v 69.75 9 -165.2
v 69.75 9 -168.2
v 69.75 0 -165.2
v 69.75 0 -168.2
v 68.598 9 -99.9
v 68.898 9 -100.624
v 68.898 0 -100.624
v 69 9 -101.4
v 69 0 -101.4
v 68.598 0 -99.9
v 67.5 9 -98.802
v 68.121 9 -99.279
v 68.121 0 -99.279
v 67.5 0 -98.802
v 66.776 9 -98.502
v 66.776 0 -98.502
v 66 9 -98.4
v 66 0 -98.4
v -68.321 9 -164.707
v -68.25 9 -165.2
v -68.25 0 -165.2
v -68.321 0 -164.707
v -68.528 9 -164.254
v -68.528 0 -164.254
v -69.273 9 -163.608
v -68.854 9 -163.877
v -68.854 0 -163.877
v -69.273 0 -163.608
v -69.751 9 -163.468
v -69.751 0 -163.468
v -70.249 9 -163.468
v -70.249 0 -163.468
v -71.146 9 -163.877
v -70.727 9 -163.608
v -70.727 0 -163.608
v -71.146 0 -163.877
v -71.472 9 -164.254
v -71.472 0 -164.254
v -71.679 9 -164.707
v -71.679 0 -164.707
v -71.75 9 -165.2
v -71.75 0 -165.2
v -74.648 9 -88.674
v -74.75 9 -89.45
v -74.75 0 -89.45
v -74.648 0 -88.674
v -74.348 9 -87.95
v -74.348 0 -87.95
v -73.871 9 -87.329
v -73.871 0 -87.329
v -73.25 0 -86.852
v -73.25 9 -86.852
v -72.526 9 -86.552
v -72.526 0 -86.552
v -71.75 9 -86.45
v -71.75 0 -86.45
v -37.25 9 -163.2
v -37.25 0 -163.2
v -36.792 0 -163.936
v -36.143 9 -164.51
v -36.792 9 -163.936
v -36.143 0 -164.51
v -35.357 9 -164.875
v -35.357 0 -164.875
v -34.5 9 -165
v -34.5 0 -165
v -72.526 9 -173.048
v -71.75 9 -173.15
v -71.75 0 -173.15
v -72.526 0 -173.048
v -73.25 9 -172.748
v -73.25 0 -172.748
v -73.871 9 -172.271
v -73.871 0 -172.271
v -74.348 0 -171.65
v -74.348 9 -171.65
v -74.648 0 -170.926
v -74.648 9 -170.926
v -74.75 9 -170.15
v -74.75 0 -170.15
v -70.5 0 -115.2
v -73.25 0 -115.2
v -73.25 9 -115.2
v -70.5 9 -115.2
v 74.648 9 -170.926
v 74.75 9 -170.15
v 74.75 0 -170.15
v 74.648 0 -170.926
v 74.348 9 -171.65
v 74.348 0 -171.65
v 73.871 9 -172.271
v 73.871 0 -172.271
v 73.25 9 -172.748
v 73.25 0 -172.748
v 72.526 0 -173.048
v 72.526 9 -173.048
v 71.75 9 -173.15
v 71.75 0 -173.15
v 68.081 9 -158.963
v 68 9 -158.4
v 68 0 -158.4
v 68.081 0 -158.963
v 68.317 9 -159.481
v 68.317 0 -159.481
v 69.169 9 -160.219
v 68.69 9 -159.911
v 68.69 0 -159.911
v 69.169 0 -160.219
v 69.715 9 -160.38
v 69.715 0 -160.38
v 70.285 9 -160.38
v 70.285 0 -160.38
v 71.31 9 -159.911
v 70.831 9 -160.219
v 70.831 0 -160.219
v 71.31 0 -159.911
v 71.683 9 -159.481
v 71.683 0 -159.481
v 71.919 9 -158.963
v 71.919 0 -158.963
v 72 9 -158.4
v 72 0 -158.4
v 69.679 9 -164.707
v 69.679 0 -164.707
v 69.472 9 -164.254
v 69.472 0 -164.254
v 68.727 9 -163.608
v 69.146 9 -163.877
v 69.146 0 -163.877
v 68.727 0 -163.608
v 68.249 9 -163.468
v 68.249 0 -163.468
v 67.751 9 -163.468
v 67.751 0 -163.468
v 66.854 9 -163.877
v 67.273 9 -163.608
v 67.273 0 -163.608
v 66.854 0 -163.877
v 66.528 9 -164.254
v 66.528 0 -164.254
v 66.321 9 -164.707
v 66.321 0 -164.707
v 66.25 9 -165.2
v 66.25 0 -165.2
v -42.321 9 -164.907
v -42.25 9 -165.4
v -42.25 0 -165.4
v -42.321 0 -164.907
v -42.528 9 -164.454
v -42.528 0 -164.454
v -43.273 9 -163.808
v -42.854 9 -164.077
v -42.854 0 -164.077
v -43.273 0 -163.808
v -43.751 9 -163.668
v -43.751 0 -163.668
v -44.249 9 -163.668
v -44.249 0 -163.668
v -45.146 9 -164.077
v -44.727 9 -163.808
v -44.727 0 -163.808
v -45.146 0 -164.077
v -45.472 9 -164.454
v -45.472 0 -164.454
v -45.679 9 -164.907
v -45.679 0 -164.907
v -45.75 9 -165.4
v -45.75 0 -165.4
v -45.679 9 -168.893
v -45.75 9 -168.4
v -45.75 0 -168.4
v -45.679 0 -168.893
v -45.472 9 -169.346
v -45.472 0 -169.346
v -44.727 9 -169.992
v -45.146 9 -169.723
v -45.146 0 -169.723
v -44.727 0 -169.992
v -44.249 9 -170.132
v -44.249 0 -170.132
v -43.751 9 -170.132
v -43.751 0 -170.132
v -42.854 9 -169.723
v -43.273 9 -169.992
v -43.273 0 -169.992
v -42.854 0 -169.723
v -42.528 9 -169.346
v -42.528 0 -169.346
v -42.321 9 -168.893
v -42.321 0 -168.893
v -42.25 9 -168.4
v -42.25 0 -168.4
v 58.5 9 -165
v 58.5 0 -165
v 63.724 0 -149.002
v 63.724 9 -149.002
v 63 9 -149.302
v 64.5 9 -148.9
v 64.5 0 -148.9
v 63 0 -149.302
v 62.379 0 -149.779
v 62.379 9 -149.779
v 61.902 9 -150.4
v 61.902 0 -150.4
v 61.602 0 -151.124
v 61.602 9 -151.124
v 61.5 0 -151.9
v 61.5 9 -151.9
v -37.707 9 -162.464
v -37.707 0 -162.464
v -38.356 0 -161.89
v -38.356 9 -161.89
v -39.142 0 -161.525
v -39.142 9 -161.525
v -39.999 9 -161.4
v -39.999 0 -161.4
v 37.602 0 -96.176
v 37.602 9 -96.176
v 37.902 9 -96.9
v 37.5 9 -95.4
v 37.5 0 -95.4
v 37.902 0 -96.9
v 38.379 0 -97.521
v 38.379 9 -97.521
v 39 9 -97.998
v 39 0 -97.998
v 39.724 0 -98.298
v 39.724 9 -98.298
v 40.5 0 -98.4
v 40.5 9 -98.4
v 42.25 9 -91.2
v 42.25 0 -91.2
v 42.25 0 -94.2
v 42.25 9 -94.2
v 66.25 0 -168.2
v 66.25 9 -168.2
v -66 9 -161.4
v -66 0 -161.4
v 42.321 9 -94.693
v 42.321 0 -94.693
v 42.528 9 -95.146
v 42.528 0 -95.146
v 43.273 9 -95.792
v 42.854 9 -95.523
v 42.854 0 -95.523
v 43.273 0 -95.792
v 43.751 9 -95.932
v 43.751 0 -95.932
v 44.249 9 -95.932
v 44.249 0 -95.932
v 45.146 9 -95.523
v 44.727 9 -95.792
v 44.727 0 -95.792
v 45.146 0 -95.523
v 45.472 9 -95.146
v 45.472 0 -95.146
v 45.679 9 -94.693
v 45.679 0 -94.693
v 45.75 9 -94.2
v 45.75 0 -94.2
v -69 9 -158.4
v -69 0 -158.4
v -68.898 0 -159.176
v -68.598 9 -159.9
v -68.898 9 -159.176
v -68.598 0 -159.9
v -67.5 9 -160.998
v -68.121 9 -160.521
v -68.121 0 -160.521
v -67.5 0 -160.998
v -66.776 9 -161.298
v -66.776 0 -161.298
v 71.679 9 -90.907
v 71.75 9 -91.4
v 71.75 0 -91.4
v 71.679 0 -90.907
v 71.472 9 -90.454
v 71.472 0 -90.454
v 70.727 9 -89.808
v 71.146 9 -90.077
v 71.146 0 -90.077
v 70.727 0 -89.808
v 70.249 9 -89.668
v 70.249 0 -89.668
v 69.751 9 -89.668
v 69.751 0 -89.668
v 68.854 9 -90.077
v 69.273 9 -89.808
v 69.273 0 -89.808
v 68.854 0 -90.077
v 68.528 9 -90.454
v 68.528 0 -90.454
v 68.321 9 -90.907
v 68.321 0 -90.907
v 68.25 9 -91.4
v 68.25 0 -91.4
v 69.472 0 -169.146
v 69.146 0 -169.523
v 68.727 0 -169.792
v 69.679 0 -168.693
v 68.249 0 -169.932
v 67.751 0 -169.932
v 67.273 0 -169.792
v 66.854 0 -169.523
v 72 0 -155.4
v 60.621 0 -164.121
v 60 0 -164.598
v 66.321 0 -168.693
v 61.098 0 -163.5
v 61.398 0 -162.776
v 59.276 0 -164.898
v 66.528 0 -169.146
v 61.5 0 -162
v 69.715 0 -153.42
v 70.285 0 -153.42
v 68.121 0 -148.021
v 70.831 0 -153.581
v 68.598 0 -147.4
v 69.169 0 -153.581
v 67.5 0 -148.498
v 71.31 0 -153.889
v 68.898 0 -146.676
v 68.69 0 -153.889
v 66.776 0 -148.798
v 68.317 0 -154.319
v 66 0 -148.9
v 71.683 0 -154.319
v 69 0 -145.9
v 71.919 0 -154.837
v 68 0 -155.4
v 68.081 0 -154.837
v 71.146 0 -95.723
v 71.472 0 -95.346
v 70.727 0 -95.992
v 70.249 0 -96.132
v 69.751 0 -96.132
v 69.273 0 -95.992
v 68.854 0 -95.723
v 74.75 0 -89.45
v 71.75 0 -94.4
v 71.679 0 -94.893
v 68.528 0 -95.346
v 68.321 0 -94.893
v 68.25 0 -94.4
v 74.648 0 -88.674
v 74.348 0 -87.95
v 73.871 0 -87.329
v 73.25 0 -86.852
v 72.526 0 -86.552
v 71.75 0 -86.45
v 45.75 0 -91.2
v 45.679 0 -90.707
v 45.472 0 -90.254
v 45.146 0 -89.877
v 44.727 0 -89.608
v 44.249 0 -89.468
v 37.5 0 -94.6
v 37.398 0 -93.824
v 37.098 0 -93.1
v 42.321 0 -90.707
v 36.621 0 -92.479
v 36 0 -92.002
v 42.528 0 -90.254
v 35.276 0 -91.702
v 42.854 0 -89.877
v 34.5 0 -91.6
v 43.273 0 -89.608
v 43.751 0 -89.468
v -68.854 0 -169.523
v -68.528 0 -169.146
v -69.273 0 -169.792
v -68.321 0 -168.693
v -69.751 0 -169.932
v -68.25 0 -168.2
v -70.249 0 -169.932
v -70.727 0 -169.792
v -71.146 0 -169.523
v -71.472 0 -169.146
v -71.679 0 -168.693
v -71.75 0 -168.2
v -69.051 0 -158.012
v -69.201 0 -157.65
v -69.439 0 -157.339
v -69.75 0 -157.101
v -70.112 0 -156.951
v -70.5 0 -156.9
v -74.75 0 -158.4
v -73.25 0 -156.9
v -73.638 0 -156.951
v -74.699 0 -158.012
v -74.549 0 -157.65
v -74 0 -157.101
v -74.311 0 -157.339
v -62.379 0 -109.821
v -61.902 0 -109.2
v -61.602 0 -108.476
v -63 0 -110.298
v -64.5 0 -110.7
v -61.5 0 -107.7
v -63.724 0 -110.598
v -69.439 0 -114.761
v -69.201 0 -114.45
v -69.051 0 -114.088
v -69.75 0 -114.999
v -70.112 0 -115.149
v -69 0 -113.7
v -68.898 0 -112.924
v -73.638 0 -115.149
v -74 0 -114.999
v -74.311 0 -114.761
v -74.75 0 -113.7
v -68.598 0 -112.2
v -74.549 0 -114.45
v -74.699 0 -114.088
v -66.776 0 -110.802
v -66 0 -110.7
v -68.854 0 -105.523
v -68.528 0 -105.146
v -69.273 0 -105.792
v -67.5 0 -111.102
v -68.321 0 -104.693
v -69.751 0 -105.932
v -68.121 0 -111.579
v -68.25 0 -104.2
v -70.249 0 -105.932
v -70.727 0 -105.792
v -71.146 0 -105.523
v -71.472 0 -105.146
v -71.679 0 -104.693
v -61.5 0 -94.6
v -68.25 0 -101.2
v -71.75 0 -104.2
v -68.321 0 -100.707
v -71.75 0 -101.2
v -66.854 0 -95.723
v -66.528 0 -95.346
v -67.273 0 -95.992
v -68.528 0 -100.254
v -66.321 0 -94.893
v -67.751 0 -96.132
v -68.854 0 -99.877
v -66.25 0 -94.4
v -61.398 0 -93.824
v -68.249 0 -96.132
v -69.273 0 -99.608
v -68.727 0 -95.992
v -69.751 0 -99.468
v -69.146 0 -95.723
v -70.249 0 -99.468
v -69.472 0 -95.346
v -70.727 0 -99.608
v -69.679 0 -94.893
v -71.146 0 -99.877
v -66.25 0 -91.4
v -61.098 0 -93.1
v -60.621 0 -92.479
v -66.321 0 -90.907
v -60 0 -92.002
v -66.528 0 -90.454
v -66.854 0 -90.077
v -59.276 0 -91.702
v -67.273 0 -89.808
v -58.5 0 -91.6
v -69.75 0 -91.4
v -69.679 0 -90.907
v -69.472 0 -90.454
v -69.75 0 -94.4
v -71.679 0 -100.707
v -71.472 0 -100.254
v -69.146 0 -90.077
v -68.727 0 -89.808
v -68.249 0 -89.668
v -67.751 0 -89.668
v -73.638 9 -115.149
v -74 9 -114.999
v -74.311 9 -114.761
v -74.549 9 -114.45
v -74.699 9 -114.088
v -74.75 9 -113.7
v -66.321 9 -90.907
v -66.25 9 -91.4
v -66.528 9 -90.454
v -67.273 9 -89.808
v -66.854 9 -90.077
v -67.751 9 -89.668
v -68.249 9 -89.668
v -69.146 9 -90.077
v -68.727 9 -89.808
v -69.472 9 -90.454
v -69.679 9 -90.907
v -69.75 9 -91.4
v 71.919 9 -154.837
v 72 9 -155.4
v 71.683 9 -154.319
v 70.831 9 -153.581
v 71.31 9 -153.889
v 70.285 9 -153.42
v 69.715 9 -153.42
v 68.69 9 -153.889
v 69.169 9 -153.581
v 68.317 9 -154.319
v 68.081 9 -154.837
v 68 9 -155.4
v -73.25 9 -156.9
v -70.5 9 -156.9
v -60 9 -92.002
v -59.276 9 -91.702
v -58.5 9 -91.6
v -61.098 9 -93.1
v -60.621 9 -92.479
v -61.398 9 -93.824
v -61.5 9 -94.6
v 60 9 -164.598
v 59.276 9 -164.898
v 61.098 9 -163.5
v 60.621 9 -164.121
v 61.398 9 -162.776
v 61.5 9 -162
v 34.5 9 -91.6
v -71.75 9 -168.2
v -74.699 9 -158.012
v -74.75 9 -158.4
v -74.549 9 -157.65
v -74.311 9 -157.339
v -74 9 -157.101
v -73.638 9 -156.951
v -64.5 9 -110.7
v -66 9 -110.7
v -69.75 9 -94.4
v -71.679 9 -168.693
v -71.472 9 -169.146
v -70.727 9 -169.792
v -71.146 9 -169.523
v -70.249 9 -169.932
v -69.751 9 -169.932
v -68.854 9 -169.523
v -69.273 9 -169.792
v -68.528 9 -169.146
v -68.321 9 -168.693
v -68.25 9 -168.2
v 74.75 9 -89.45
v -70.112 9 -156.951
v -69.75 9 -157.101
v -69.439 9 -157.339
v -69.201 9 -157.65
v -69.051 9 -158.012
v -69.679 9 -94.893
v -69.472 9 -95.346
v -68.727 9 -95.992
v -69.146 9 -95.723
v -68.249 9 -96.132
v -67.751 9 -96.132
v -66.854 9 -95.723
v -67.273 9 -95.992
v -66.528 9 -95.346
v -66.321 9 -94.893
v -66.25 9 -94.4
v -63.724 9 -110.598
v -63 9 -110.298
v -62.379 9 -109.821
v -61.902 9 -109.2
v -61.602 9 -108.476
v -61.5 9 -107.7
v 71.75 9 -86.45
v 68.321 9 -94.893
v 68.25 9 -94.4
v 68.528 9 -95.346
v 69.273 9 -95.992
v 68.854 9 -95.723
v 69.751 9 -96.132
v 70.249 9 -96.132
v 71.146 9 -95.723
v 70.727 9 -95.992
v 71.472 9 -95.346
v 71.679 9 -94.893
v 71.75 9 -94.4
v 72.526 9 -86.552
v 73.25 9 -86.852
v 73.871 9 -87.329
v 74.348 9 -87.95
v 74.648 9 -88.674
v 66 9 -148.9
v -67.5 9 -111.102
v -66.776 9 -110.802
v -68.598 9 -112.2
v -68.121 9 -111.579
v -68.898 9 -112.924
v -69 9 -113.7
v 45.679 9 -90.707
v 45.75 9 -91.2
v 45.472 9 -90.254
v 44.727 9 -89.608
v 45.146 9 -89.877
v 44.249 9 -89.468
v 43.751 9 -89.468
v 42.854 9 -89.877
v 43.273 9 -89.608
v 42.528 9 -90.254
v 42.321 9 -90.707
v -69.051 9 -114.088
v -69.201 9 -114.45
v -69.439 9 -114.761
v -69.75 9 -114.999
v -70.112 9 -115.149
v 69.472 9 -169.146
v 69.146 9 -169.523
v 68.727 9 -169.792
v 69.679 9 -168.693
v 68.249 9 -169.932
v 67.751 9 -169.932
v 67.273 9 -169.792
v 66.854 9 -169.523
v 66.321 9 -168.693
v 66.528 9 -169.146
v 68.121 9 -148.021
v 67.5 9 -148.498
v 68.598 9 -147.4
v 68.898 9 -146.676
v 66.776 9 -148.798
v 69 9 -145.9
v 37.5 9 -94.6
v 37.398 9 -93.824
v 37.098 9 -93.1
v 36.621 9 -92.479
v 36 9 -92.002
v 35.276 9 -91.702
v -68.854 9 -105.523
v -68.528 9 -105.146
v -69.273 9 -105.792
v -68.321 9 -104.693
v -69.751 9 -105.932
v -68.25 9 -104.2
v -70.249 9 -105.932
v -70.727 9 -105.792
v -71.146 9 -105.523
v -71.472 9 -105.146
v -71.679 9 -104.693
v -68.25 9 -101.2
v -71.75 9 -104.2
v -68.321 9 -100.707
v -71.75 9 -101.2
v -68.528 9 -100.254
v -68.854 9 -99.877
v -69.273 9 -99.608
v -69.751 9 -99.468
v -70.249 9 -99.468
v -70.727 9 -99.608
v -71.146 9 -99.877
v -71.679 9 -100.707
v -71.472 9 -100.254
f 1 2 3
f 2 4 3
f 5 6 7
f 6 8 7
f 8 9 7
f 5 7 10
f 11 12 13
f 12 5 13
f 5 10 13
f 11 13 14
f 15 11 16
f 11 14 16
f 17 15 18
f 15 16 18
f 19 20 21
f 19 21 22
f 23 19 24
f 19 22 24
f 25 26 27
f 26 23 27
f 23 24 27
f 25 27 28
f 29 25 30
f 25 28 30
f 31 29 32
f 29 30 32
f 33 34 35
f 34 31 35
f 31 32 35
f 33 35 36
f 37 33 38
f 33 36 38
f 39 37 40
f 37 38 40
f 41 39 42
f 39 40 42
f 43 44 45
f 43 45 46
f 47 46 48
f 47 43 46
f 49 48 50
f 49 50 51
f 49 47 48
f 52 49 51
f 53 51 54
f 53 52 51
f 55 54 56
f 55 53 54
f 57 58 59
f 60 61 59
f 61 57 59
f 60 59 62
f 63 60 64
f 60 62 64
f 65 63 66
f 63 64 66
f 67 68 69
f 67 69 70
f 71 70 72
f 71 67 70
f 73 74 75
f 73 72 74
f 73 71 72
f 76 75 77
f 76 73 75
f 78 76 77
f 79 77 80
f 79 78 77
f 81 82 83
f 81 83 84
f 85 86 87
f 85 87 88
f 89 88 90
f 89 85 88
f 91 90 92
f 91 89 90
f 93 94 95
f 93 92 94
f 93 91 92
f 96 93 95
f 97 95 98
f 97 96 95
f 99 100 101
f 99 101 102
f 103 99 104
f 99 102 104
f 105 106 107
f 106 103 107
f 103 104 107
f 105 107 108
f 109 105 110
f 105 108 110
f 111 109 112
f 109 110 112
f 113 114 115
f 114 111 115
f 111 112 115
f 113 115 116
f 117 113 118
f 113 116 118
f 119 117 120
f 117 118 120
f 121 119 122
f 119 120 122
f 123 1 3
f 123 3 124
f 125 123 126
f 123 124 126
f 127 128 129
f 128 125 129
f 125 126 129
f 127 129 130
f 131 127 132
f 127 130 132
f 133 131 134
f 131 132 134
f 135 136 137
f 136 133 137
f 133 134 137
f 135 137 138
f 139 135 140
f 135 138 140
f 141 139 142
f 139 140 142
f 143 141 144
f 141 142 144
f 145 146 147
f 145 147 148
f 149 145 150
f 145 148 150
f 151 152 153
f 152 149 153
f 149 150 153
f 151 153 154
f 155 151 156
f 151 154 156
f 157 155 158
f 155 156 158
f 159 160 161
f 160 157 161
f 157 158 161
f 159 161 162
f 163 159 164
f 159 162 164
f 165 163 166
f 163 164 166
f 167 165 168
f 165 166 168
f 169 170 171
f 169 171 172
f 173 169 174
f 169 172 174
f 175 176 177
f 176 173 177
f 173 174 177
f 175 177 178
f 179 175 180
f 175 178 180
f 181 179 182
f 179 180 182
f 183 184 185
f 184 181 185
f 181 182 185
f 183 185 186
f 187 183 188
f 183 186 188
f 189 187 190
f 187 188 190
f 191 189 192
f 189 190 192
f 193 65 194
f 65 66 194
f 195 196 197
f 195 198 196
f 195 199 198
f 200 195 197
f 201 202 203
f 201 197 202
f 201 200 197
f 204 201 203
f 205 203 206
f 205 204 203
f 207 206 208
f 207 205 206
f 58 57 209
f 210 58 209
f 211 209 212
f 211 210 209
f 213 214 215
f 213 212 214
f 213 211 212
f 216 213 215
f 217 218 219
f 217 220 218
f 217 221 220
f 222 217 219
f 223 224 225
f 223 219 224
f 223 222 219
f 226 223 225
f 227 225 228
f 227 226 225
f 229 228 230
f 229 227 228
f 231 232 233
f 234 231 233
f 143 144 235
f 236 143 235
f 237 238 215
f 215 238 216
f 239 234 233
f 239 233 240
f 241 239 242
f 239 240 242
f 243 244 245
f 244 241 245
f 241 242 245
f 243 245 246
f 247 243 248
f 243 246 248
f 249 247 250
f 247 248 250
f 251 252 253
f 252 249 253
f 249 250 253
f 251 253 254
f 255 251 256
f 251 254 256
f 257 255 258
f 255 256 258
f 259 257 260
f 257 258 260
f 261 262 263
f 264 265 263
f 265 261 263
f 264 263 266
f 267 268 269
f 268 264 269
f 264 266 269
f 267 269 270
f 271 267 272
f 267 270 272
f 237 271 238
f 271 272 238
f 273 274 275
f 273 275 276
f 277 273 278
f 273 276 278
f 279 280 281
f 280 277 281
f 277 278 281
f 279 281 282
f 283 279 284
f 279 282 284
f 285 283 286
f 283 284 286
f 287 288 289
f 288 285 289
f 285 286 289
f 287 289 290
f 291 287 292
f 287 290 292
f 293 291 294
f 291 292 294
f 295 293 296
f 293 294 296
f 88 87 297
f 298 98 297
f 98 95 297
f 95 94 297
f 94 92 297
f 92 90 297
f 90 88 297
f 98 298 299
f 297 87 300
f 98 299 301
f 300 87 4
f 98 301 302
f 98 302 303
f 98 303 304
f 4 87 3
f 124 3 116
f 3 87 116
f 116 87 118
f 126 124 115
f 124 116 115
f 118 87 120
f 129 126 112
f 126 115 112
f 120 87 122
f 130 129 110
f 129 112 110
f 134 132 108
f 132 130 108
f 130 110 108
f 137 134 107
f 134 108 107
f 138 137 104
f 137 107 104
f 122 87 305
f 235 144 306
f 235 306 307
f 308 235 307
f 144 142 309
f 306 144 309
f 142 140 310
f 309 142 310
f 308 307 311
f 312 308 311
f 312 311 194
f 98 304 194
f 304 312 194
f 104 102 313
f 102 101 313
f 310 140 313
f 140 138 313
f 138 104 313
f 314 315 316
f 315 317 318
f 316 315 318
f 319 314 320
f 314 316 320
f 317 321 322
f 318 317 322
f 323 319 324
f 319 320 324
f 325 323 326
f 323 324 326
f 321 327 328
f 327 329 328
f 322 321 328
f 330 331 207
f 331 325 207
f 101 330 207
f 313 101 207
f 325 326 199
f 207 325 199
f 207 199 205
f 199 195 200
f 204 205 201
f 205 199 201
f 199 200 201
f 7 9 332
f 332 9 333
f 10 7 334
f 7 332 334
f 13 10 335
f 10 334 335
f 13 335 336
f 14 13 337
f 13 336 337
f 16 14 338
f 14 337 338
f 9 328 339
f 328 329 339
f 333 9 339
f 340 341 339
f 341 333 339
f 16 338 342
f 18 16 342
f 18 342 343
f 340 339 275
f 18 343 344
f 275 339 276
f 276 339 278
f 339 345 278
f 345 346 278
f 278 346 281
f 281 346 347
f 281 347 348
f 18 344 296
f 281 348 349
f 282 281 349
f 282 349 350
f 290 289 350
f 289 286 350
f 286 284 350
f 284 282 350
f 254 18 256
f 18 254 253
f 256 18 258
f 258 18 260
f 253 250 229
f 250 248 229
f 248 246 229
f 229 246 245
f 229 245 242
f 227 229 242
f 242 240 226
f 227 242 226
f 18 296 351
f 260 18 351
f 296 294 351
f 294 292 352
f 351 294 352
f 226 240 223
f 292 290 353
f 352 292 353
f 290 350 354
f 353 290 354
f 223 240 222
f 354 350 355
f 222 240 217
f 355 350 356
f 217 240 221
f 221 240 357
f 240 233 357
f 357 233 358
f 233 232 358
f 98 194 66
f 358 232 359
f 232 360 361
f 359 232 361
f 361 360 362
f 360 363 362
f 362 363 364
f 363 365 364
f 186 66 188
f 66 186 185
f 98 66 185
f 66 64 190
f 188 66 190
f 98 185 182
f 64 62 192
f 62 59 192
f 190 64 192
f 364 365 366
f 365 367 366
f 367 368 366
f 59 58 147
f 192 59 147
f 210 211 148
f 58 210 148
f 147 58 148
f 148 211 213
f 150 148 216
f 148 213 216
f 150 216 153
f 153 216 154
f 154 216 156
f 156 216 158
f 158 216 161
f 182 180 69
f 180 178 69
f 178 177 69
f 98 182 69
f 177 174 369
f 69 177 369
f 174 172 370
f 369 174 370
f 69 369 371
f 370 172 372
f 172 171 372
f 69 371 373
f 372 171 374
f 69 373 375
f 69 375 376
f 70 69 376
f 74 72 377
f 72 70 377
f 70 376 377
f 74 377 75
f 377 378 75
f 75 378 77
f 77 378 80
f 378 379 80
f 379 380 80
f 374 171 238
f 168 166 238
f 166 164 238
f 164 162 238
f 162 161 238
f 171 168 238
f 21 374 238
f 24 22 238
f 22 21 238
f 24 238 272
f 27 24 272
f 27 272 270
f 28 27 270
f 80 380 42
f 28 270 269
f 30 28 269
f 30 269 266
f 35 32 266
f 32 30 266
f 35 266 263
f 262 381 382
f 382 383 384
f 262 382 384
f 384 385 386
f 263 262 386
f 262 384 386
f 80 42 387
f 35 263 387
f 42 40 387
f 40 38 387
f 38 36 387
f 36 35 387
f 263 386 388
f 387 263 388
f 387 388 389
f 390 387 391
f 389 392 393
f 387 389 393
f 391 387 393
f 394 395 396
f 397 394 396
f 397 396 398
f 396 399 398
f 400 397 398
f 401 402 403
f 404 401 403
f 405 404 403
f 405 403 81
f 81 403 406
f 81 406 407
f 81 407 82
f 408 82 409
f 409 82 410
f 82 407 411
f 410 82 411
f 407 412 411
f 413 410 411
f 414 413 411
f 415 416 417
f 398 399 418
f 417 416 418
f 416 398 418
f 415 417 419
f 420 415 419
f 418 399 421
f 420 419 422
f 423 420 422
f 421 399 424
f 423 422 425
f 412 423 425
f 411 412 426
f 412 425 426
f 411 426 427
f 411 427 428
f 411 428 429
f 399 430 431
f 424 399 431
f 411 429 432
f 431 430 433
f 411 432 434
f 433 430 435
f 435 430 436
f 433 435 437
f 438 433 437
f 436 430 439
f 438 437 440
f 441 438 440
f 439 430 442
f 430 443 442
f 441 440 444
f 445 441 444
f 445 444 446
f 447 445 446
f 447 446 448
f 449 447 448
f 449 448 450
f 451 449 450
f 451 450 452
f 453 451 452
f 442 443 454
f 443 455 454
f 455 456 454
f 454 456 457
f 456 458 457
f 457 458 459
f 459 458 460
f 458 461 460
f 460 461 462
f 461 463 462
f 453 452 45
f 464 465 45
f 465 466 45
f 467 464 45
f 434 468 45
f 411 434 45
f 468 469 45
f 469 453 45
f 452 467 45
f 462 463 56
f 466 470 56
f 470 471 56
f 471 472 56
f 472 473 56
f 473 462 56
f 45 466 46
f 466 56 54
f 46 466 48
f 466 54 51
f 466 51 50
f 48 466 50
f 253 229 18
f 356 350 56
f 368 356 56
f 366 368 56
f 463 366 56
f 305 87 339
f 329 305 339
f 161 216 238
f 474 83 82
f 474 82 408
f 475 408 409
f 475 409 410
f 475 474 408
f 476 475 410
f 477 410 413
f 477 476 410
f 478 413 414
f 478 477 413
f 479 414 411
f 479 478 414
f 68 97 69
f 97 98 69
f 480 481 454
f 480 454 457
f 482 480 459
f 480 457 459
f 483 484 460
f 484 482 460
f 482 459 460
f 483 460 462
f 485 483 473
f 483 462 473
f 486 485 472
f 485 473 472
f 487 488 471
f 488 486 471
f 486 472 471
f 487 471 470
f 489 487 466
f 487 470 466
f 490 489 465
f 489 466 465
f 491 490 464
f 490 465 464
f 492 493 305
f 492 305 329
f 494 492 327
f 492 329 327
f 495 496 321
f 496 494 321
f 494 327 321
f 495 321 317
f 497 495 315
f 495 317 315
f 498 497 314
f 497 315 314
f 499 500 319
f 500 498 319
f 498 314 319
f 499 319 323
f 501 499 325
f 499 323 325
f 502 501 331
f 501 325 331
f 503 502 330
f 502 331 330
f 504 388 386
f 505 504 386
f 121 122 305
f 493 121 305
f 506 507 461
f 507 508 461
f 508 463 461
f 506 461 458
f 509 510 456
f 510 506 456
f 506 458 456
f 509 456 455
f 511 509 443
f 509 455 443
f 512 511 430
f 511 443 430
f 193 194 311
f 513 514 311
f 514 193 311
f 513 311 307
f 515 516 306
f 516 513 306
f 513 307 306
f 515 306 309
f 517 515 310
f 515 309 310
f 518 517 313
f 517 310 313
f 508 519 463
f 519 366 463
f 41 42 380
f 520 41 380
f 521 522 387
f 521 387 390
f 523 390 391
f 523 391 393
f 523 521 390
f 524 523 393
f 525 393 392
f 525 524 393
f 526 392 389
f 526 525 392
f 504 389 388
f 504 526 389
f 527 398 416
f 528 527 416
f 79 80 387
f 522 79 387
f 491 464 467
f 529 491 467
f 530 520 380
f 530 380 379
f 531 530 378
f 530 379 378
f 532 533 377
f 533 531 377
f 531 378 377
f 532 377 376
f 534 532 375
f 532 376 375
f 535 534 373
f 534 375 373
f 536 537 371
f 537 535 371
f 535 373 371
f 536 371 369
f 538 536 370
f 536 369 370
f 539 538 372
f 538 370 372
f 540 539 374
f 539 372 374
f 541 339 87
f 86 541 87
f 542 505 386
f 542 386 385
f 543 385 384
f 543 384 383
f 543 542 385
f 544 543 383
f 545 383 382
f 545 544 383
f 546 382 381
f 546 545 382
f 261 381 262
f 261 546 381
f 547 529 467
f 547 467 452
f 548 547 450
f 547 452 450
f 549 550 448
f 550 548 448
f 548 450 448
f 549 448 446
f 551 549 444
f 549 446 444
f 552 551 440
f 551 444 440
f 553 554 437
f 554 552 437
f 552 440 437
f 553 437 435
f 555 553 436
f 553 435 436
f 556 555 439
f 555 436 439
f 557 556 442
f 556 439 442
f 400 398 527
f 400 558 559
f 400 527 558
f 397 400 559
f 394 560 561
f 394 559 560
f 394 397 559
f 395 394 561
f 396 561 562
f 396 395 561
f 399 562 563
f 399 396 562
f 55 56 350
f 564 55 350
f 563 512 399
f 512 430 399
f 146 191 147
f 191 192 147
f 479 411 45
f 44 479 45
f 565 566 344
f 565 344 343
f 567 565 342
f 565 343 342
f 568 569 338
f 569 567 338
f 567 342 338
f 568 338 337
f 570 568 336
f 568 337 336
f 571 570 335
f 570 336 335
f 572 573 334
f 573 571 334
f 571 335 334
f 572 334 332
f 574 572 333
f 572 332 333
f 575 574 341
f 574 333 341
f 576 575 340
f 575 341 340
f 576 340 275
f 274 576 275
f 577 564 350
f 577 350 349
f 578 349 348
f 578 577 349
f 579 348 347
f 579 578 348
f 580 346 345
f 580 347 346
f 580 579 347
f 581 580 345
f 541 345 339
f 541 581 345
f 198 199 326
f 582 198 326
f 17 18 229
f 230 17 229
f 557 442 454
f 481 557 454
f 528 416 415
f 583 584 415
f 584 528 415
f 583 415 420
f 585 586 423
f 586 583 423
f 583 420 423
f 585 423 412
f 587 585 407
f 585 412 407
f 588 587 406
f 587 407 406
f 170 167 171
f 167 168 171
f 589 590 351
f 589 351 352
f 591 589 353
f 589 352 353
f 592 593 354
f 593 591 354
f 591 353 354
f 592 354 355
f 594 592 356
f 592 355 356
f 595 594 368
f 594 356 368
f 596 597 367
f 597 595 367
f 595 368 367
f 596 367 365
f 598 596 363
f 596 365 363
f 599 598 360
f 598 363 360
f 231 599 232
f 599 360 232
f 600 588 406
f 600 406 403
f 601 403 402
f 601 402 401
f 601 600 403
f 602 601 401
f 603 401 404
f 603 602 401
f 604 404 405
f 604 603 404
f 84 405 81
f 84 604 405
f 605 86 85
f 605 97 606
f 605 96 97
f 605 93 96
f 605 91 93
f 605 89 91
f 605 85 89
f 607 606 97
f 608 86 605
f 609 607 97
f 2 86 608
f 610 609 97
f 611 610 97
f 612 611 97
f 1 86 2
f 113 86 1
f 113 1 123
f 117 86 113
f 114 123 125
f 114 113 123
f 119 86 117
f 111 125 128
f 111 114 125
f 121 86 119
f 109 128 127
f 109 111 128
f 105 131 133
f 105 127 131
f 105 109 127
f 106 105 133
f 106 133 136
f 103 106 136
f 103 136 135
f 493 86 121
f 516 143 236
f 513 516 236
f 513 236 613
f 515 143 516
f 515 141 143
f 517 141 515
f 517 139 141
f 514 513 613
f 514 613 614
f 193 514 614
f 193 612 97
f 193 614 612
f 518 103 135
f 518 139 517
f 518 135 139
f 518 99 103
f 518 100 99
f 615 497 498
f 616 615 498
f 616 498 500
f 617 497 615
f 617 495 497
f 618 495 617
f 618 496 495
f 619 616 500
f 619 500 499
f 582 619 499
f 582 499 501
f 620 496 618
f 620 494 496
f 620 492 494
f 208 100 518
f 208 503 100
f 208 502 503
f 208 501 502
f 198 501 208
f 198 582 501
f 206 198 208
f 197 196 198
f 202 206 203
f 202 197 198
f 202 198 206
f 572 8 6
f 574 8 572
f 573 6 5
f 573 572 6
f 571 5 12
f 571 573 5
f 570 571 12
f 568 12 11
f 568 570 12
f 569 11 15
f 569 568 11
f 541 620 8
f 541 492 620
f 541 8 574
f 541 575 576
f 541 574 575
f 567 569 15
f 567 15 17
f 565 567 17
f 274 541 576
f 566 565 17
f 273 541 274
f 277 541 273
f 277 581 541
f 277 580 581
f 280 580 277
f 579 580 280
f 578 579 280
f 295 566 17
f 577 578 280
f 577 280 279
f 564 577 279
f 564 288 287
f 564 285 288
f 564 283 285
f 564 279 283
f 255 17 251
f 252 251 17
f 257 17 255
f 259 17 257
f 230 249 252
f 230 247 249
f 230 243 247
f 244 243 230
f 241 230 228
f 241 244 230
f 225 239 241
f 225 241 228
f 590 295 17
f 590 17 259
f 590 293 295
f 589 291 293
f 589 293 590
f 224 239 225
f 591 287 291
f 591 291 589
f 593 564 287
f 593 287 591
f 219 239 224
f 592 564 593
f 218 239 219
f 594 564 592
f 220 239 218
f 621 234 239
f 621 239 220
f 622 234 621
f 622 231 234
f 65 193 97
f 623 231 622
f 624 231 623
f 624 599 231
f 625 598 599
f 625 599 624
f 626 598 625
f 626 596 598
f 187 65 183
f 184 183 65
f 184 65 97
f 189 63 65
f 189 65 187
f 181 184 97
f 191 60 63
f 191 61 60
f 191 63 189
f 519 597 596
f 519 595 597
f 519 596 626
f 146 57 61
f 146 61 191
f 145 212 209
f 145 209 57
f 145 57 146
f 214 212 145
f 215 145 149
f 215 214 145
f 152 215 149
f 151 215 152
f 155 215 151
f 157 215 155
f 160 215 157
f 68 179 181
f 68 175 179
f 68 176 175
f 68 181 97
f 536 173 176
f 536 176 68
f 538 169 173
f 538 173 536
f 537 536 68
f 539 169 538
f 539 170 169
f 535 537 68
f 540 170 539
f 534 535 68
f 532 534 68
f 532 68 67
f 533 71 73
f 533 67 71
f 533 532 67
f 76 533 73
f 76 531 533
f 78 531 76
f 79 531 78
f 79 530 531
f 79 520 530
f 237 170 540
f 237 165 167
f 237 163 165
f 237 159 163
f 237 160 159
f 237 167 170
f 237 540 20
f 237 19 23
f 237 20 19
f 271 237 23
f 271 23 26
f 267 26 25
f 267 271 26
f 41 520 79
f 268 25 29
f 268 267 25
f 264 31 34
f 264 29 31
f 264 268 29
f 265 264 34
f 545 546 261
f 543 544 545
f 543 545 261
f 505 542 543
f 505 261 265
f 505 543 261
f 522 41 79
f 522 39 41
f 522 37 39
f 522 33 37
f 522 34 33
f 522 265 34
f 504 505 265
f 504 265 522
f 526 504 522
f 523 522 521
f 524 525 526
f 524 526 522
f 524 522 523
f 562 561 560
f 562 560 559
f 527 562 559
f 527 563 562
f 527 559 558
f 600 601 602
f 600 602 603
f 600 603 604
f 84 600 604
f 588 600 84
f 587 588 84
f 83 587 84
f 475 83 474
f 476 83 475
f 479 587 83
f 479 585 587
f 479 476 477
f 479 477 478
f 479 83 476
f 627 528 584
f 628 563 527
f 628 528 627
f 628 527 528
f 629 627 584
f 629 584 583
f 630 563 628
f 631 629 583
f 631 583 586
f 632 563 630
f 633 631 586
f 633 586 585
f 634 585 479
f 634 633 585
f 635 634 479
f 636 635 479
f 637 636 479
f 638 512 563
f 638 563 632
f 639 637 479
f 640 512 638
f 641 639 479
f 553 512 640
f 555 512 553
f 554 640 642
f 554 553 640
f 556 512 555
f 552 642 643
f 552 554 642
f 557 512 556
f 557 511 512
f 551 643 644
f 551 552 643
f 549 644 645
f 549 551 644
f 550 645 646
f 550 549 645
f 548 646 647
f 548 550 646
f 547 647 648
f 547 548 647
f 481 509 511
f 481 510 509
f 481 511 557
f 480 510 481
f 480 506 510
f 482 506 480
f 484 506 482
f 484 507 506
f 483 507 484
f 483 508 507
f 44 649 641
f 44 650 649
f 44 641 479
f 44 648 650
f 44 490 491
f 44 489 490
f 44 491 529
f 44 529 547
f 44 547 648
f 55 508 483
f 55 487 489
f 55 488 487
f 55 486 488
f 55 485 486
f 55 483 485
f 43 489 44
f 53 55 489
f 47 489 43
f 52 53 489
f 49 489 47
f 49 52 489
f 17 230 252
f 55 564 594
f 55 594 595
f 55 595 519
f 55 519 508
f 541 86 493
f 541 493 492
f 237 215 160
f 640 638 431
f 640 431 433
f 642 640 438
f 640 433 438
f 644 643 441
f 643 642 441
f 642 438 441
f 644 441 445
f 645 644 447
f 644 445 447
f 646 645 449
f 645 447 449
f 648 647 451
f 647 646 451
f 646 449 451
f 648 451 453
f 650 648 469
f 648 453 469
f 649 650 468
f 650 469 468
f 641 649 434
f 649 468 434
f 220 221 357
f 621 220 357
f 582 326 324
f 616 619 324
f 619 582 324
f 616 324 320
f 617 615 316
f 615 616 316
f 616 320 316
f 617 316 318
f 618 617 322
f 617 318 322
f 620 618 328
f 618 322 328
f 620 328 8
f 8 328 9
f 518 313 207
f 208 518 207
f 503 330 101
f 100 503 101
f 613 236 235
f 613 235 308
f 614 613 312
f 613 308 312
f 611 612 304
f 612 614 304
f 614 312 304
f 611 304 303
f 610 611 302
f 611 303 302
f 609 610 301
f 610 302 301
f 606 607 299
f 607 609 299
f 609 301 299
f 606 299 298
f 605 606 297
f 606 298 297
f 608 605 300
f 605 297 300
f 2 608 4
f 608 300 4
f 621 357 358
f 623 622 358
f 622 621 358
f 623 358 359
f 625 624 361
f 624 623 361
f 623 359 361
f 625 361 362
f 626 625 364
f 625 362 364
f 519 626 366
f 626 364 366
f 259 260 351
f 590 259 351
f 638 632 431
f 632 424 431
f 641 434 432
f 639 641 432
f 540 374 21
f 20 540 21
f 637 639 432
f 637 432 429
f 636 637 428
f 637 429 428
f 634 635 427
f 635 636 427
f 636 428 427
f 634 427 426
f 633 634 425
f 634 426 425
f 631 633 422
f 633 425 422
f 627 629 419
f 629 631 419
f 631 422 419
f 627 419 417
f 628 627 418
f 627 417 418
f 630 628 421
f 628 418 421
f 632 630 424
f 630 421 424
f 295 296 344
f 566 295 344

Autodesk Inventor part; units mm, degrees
ref_plane "YZ Plane" through (0, 0, 0) normal (1, 0, 0) x (0, 1, 0)
ref_plane "XZ Plane" through (0, 0, 0) normal (0, 1, 0) x (-1, 0, 0)
ref_plane "XY Plane" through (0, 0, 0) normal (0, 0, 1) x (1, 0, 0)
sketch "Sketch1" plane through (0, 0, 0) normal (0, 1, 0) x (-1, 0, 0)
  arc A0 (-69, -145.9) -> (-66, -148.9) centre (-66, -145.9) ccw
  line L0 (-64.5, -148.9) -> (-66, -148.9)
  arc A1 (-68, -155.4) -> (-72, -155.4) centre (-70, -155.4) ccw
  line L1 (-68, -155.4) -> (-68, -158.4)
  line L2 (-72, -158.4) -> (-72, -155.4)
  arc A2 (-72, -158.4) -> (-68, -158.4) centre (-70, -158.4) ccw
  line L3 (-61.5, -162) -> (-61.5, -151.9)
  arc A3 (-66.25, -165.2) -> (-69.75, -165.2) centre (-68, -165.2) ccw
  line L4 (-66.25, -165.2) -> (-66.25, -168.2)
  line L5 (-69.75, -168.2) -> (-69.75, -165.2)
  arc A4 (-69.75, -168.2) -> (-66.25, -168.2) centre (-68, -168.2) ccw
  arc A5 (-61.5, -151.9) -> (-64.5, -148.9) centre (-64.5, -151.9) ccw
  arc A6 (61.5, -94.6) -> (58.5, -91.6) centre (58.5, -94.6) ccw
  line L6 (61.5, -94.6) -> (61.5, -107.7)
  line L7 (66.25, -94.4) -> (66.25, -91.4)
  arc A7 (69.75, -91.4) -> (66.25, -91.4) centre (68, -91.4) ccw
  line L8 (69.75, -91.4) -> (69.75, -94.4)
  arc A8 (66.25, -94.4) -> (69.75, -94.4) centre (68, -94.4) ccw
  arc A9 (71.75, -101.2) -> (68.25, -101.2) centre (70, -101.2) ccw
  line L9 (71.75, -101.2) -> (71.75, -104.2)
  arc A10 (68.25, -104.2) -> (71.75, -104.2) centre (70, -104.2) ccw
  arc A11 (61.5, -107.7) -> (64.5, -110.7) centre (64.5, -107.7) ccw
  line L10 (64.5, -110.7) -> (66, -110.7)
  arc A12 (69, -113.7) -> (66, -110.7) centre (66, -113.7) ccw
  line L11 (69, -113.7) -> (69, -158.4)
  line L12 (68.25, -104.2) -> (68.25, -101.2)
  arc A13 (66, -161.4) -> (69, -158.4) centre (66, -158.4) ccw
  arc A14 (71.75, -165.2) -> (68.25, -165.2) centre (70, -165.2) ccw
  line L13 (71.75, -165.2) -> (71.75, -168.2)
  arc A15 (68.25, -168.2) -> (71.75, -168.2) centre (70, -168.2) ccw
  line L14 (68.25, -168.2) -> (68.25, -165.2)
  line L15 (66, -161.4) -> (39.9991, -161.4)
  arc A16 (45.75, -165.4) -> (42.25, -165.4) centre (44, -165.4) ccw
  arc A17 (39.9991, -161.4) -> (37.2495, -163.2) centre (39.9991, -164.4) ccw
  line L16 (45.75, -165.4) -> (45.75, -168.4)
  arc A18 (34.5, -165) -> (37.2495, -163.2) centre (34.5, -162) ccw
  line L17 (42.25, -168.4) -> (42.25, -165.4)
  arc A19 (42.25, -168.4) -> (45.75, -168.4) centre (44, -168.4) ccw
  line L18 (34.5, -165) -> (-58.5, -165)
  arc A20 (-61.5, -162) -> (-58.5, -165) centre (-58.5, -162) ccw
  line L19 (-66, -98.4) -> (-40.5, -98.4)
  arc A21 (-71.75, -94.4) -> (-68.25, -94.4) centre (-70, -94.4) ccw
  arc A22 (-68.25, -91.4) -> (-71.75, -91.4) centre (-70, -91.4) ccw
  line L20 (-71.75, -94.4) -> (-71.75, -91.4)
  line L21 (-68.25, -91.4) -> (-68.25, -94.4)
  line L22 (-69, -145.9) -> (-69, -101.4)
  arc A23 (-66, -98.4) -> (-69, -101.4) centre (-66, -101.4) ccw
  line L23 (-45.75, -94.2) -> (-45.75, -91.2)
  arc A24 (-42.25, -91.2) -> (-45.75, -91.2) centre (-44, -91.2) ccw
  line L24 (-42.25, -91.2) -> (-42.25, -94.2)
  arc A25 (-45.75, -94.2) -> (-42.25, -94.2) centre (-44, -94.2) ccw
  line L25 (-34.5, -91.6) -> (58.5, -91.6)
  arc A26 (-34.5, -91.6) -> (-37.5, -94.6) centre (-34.5, -94.6) ccw
  line L26 (-37.5, -95.4) -> (-37.5, -94.6)
  arc A27 (-40.5, -98.4) -> (-37.5, -95.4) centre (-40.5, -95.4) ccw
  line L27 (74.75, -86.45) -> (-74.75, -86.45)
  line L28 (-74.75, -86.45) -> (-74.75, -173.15)
  line L29 (-74.75, -173.15) -> (74.75, -173.15)
  line L30 (74.75, -173.15) -> (74.75, -86.45)
  point P0 (0, 0)
  dimension "d0" = 1.75
  dimension "d1" = 3
  dimension "d2" = 2
  dimension "d3" = 2
  dimension "d4" = 2.75
  dimension "d5" = 10.25
  dimension "d6" = 26
  dimension "d7" = 109.25
  dimension "d8" = 114
  dimension "d9" = 133.25
  dimension "d10" = 138
  dimension "d11" = 139.75
  dimension "d12" = 140
  dimension "d13" = 140.75
  dimension "d14" = 50.7
  dimension "d15" = 19.1
  dimension "d16" = 54.3
  dimension "d17" = 12.3
  dimension "d18" = 38.2
  dimension "d19" = 9.5
  dimension "d20" = 6.5
  dimension "d21" = 54.5
  dimension "d22" = 57.5
  dimension "d23" = 19.3
  dimension "d24" = 16.3
  dimension "d25" = 54.7
  dimension "d26" = 57.7
  dimension "d27" = 31.7509
  dimension "d28" = 19.5
  dimension "d29" = 16.5
  dimension "d30" = 54.5
  dimension "d31" = 44.7
  dimension "d32" = 137.75
  dimension "d33" = 57.5
  dimension "d34" = 16.3
  dimension "d35" = 139
  dimension "d36" = 19.3
  dimension "d37" = 139
  dimension "d38" = 47.7
  dimension "d40" = 3
  dimension "d41" = 3
  dimension "d42" = 3
  dimension "d43" = 3
extrude "Extrusion1" add sketch "Sketch1" along normal blind 9
fillet "Fillet1" radius 3 4 edges at (-74.75, 4.5, -86.45) (-74.75, 4.5, -173.15) (74.75, 4.5, -173.15) (74.75, 4.5, -86.45)
sketch "Sketch2" plane through (0, 9, 0) normal (0, 1, 0) x (1, 0, 0)
  line L0 (-69, 113.7) -> (-69, 158.4) projected
  line L1 (-74.75, 170.15) -> (-74.75, 89.45) projected
  arc A0 (-66, 161.4) -> (-69, 158.4) centre (-66, 158.4) ccw projected
  arc A1 (-70.5, 156.9) -> (-69, 158.4) centre (-70.5, 158.4) ccw
  arc A2 (-74.75, 158.4) -> (-73.25, 156.9) centre (-73.25, 158.4) ccw
  line L2 (-73.25, 156.9) -> (-70.5, 156.9)
  line L3 (-73.25, 115.2) -> (-70.5, 115.2)
  arc A3 (-73.25, 115.2) -> (-74.75, 113.7) centre (-73.25, 113.7) ccw
  arc A4 (-69, 113.7) -> (-70.5, 115.2) centre (-70.5, 113.7) ccw
  point P0 (0, 0)
  dimension "d50" = 3
  dimension "d51" = 3
extrude "Extrusion3" cut sketch "Sketch2" against normal up to surface (9 mm away)
properties part number "psu_spacer"
